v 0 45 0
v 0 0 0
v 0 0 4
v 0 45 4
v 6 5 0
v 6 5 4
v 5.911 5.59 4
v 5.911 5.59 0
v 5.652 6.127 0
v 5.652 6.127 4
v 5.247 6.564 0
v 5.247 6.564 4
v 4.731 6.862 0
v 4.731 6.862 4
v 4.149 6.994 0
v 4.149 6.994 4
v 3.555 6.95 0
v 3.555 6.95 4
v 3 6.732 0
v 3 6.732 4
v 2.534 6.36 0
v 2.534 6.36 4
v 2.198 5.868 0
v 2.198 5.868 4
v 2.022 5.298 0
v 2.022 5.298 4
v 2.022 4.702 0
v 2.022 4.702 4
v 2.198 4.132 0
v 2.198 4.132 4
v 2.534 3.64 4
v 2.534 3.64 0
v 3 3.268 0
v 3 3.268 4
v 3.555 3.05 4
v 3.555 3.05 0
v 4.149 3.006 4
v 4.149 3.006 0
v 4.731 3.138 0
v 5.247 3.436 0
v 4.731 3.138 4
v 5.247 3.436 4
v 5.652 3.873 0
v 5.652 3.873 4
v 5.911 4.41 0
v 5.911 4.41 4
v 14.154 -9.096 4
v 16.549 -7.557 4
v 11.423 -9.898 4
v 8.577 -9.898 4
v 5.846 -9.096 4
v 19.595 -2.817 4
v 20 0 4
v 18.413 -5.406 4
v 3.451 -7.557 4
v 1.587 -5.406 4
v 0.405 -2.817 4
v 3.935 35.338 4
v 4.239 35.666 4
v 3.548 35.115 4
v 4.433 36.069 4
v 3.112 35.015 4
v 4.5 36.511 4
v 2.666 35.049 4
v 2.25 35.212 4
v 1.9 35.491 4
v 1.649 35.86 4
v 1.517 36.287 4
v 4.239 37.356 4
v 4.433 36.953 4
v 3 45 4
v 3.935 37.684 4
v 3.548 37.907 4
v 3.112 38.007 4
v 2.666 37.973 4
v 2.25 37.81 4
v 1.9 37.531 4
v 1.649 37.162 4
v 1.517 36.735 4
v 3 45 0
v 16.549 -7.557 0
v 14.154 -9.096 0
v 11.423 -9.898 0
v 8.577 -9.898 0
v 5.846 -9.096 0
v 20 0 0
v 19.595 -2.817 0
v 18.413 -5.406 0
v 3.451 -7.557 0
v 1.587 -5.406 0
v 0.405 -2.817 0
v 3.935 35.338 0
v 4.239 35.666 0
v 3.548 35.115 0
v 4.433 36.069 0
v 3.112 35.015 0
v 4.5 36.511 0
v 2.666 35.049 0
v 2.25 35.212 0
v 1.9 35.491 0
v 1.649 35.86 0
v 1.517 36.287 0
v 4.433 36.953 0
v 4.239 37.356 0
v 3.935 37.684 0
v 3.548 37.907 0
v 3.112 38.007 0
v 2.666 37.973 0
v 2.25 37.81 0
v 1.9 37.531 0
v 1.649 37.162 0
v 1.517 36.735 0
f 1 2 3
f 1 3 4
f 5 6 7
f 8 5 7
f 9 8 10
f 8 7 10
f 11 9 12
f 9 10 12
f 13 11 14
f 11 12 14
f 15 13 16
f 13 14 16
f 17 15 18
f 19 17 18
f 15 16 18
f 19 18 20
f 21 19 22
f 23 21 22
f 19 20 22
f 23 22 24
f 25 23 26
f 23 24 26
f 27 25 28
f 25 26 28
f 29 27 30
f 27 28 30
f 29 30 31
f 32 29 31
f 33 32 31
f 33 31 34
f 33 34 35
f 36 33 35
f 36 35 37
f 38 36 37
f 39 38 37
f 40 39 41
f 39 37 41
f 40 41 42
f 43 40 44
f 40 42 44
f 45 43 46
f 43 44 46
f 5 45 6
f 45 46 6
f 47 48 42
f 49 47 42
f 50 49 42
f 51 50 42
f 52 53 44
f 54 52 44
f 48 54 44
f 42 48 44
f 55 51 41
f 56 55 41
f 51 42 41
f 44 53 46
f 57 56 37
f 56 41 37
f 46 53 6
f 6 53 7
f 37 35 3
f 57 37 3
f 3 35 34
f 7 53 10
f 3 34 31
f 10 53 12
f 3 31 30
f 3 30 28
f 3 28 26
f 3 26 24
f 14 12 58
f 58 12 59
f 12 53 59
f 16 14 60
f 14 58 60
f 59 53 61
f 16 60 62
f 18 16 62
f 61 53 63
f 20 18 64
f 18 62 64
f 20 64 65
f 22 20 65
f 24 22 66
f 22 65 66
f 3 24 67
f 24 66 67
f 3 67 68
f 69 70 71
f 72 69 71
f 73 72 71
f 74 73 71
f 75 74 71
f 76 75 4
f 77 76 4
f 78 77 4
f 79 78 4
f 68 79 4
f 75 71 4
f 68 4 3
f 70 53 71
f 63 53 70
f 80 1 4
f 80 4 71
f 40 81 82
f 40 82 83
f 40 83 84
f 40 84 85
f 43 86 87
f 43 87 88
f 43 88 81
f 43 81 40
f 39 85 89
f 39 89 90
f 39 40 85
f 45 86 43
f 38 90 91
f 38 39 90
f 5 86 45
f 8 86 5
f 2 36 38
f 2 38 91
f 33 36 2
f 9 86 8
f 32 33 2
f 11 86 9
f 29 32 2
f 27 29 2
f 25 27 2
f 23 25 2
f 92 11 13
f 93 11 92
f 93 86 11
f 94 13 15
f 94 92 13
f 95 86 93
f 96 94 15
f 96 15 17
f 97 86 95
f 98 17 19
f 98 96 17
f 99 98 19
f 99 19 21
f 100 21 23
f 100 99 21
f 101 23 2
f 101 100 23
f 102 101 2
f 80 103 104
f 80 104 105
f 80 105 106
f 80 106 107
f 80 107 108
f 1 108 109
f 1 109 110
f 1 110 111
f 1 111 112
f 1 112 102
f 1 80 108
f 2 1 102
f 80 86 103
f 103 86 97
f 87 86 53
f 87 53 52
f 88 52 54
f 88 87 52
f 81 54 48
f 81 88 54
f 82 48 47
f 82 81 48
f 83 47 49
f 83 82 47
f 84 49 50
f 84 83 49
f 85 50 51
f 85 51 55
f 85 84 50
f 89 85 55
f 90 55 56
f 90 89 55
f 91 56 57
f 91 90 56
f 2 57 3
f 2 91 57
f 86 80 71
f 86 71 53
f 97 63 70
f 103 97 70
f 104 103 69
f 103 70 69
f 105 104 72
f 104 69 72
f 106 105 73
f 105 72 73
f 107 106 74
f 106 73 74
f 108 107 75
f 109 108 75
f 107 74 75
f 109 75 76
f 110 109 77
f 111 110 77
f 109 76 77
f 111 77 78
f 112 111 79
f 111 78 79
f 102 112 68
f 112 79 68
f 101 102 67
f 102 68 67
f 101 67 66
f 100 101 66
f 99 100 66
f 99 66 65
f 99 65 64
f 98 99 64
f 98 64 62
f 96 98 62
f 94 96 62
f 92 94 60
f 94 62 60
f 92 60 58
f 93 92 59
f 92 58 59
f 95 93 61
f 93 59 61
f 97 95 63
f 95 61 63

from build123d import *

# Parameters (mm, degrees)
BOSS_EXTRUDE1_DEPTH = 4
SKETCH2_R           = 2
SKETCH2_R_2         = 1.5
CUT_EXTRUDE1_DEPTH  = 4


with BuildPart() as part:
    # Sketch1 → Boss-Extrude1 (new body)
    with BuildSketch(Plane.XY):
        with BuildLine():
            Line((0, 0), (0, 45))
            Line((0, 45), (3, 45))
            Line((3, 45), (20, 0))
            ThreePointArc((20, 0), (10, -10), (0, 0))
        make_face()
    extrude(amount=BOSS_EXTRUDE1_DEPTH)

    # Sketch2 → Cut-Extrude1 (cut)
    with BuildSketch(Plane.XY.offset(4)):
        with Locations((4, 5)):
            Circle(SKETCH2_R)
        with Locations((3, 36.511049315)):
            Circle(SKETCH2_R_2)
    extrude(amount=-CUT_EXTRUDE1_DEPTH, mode=Mode.SUBTRACT)


solid = part.part
